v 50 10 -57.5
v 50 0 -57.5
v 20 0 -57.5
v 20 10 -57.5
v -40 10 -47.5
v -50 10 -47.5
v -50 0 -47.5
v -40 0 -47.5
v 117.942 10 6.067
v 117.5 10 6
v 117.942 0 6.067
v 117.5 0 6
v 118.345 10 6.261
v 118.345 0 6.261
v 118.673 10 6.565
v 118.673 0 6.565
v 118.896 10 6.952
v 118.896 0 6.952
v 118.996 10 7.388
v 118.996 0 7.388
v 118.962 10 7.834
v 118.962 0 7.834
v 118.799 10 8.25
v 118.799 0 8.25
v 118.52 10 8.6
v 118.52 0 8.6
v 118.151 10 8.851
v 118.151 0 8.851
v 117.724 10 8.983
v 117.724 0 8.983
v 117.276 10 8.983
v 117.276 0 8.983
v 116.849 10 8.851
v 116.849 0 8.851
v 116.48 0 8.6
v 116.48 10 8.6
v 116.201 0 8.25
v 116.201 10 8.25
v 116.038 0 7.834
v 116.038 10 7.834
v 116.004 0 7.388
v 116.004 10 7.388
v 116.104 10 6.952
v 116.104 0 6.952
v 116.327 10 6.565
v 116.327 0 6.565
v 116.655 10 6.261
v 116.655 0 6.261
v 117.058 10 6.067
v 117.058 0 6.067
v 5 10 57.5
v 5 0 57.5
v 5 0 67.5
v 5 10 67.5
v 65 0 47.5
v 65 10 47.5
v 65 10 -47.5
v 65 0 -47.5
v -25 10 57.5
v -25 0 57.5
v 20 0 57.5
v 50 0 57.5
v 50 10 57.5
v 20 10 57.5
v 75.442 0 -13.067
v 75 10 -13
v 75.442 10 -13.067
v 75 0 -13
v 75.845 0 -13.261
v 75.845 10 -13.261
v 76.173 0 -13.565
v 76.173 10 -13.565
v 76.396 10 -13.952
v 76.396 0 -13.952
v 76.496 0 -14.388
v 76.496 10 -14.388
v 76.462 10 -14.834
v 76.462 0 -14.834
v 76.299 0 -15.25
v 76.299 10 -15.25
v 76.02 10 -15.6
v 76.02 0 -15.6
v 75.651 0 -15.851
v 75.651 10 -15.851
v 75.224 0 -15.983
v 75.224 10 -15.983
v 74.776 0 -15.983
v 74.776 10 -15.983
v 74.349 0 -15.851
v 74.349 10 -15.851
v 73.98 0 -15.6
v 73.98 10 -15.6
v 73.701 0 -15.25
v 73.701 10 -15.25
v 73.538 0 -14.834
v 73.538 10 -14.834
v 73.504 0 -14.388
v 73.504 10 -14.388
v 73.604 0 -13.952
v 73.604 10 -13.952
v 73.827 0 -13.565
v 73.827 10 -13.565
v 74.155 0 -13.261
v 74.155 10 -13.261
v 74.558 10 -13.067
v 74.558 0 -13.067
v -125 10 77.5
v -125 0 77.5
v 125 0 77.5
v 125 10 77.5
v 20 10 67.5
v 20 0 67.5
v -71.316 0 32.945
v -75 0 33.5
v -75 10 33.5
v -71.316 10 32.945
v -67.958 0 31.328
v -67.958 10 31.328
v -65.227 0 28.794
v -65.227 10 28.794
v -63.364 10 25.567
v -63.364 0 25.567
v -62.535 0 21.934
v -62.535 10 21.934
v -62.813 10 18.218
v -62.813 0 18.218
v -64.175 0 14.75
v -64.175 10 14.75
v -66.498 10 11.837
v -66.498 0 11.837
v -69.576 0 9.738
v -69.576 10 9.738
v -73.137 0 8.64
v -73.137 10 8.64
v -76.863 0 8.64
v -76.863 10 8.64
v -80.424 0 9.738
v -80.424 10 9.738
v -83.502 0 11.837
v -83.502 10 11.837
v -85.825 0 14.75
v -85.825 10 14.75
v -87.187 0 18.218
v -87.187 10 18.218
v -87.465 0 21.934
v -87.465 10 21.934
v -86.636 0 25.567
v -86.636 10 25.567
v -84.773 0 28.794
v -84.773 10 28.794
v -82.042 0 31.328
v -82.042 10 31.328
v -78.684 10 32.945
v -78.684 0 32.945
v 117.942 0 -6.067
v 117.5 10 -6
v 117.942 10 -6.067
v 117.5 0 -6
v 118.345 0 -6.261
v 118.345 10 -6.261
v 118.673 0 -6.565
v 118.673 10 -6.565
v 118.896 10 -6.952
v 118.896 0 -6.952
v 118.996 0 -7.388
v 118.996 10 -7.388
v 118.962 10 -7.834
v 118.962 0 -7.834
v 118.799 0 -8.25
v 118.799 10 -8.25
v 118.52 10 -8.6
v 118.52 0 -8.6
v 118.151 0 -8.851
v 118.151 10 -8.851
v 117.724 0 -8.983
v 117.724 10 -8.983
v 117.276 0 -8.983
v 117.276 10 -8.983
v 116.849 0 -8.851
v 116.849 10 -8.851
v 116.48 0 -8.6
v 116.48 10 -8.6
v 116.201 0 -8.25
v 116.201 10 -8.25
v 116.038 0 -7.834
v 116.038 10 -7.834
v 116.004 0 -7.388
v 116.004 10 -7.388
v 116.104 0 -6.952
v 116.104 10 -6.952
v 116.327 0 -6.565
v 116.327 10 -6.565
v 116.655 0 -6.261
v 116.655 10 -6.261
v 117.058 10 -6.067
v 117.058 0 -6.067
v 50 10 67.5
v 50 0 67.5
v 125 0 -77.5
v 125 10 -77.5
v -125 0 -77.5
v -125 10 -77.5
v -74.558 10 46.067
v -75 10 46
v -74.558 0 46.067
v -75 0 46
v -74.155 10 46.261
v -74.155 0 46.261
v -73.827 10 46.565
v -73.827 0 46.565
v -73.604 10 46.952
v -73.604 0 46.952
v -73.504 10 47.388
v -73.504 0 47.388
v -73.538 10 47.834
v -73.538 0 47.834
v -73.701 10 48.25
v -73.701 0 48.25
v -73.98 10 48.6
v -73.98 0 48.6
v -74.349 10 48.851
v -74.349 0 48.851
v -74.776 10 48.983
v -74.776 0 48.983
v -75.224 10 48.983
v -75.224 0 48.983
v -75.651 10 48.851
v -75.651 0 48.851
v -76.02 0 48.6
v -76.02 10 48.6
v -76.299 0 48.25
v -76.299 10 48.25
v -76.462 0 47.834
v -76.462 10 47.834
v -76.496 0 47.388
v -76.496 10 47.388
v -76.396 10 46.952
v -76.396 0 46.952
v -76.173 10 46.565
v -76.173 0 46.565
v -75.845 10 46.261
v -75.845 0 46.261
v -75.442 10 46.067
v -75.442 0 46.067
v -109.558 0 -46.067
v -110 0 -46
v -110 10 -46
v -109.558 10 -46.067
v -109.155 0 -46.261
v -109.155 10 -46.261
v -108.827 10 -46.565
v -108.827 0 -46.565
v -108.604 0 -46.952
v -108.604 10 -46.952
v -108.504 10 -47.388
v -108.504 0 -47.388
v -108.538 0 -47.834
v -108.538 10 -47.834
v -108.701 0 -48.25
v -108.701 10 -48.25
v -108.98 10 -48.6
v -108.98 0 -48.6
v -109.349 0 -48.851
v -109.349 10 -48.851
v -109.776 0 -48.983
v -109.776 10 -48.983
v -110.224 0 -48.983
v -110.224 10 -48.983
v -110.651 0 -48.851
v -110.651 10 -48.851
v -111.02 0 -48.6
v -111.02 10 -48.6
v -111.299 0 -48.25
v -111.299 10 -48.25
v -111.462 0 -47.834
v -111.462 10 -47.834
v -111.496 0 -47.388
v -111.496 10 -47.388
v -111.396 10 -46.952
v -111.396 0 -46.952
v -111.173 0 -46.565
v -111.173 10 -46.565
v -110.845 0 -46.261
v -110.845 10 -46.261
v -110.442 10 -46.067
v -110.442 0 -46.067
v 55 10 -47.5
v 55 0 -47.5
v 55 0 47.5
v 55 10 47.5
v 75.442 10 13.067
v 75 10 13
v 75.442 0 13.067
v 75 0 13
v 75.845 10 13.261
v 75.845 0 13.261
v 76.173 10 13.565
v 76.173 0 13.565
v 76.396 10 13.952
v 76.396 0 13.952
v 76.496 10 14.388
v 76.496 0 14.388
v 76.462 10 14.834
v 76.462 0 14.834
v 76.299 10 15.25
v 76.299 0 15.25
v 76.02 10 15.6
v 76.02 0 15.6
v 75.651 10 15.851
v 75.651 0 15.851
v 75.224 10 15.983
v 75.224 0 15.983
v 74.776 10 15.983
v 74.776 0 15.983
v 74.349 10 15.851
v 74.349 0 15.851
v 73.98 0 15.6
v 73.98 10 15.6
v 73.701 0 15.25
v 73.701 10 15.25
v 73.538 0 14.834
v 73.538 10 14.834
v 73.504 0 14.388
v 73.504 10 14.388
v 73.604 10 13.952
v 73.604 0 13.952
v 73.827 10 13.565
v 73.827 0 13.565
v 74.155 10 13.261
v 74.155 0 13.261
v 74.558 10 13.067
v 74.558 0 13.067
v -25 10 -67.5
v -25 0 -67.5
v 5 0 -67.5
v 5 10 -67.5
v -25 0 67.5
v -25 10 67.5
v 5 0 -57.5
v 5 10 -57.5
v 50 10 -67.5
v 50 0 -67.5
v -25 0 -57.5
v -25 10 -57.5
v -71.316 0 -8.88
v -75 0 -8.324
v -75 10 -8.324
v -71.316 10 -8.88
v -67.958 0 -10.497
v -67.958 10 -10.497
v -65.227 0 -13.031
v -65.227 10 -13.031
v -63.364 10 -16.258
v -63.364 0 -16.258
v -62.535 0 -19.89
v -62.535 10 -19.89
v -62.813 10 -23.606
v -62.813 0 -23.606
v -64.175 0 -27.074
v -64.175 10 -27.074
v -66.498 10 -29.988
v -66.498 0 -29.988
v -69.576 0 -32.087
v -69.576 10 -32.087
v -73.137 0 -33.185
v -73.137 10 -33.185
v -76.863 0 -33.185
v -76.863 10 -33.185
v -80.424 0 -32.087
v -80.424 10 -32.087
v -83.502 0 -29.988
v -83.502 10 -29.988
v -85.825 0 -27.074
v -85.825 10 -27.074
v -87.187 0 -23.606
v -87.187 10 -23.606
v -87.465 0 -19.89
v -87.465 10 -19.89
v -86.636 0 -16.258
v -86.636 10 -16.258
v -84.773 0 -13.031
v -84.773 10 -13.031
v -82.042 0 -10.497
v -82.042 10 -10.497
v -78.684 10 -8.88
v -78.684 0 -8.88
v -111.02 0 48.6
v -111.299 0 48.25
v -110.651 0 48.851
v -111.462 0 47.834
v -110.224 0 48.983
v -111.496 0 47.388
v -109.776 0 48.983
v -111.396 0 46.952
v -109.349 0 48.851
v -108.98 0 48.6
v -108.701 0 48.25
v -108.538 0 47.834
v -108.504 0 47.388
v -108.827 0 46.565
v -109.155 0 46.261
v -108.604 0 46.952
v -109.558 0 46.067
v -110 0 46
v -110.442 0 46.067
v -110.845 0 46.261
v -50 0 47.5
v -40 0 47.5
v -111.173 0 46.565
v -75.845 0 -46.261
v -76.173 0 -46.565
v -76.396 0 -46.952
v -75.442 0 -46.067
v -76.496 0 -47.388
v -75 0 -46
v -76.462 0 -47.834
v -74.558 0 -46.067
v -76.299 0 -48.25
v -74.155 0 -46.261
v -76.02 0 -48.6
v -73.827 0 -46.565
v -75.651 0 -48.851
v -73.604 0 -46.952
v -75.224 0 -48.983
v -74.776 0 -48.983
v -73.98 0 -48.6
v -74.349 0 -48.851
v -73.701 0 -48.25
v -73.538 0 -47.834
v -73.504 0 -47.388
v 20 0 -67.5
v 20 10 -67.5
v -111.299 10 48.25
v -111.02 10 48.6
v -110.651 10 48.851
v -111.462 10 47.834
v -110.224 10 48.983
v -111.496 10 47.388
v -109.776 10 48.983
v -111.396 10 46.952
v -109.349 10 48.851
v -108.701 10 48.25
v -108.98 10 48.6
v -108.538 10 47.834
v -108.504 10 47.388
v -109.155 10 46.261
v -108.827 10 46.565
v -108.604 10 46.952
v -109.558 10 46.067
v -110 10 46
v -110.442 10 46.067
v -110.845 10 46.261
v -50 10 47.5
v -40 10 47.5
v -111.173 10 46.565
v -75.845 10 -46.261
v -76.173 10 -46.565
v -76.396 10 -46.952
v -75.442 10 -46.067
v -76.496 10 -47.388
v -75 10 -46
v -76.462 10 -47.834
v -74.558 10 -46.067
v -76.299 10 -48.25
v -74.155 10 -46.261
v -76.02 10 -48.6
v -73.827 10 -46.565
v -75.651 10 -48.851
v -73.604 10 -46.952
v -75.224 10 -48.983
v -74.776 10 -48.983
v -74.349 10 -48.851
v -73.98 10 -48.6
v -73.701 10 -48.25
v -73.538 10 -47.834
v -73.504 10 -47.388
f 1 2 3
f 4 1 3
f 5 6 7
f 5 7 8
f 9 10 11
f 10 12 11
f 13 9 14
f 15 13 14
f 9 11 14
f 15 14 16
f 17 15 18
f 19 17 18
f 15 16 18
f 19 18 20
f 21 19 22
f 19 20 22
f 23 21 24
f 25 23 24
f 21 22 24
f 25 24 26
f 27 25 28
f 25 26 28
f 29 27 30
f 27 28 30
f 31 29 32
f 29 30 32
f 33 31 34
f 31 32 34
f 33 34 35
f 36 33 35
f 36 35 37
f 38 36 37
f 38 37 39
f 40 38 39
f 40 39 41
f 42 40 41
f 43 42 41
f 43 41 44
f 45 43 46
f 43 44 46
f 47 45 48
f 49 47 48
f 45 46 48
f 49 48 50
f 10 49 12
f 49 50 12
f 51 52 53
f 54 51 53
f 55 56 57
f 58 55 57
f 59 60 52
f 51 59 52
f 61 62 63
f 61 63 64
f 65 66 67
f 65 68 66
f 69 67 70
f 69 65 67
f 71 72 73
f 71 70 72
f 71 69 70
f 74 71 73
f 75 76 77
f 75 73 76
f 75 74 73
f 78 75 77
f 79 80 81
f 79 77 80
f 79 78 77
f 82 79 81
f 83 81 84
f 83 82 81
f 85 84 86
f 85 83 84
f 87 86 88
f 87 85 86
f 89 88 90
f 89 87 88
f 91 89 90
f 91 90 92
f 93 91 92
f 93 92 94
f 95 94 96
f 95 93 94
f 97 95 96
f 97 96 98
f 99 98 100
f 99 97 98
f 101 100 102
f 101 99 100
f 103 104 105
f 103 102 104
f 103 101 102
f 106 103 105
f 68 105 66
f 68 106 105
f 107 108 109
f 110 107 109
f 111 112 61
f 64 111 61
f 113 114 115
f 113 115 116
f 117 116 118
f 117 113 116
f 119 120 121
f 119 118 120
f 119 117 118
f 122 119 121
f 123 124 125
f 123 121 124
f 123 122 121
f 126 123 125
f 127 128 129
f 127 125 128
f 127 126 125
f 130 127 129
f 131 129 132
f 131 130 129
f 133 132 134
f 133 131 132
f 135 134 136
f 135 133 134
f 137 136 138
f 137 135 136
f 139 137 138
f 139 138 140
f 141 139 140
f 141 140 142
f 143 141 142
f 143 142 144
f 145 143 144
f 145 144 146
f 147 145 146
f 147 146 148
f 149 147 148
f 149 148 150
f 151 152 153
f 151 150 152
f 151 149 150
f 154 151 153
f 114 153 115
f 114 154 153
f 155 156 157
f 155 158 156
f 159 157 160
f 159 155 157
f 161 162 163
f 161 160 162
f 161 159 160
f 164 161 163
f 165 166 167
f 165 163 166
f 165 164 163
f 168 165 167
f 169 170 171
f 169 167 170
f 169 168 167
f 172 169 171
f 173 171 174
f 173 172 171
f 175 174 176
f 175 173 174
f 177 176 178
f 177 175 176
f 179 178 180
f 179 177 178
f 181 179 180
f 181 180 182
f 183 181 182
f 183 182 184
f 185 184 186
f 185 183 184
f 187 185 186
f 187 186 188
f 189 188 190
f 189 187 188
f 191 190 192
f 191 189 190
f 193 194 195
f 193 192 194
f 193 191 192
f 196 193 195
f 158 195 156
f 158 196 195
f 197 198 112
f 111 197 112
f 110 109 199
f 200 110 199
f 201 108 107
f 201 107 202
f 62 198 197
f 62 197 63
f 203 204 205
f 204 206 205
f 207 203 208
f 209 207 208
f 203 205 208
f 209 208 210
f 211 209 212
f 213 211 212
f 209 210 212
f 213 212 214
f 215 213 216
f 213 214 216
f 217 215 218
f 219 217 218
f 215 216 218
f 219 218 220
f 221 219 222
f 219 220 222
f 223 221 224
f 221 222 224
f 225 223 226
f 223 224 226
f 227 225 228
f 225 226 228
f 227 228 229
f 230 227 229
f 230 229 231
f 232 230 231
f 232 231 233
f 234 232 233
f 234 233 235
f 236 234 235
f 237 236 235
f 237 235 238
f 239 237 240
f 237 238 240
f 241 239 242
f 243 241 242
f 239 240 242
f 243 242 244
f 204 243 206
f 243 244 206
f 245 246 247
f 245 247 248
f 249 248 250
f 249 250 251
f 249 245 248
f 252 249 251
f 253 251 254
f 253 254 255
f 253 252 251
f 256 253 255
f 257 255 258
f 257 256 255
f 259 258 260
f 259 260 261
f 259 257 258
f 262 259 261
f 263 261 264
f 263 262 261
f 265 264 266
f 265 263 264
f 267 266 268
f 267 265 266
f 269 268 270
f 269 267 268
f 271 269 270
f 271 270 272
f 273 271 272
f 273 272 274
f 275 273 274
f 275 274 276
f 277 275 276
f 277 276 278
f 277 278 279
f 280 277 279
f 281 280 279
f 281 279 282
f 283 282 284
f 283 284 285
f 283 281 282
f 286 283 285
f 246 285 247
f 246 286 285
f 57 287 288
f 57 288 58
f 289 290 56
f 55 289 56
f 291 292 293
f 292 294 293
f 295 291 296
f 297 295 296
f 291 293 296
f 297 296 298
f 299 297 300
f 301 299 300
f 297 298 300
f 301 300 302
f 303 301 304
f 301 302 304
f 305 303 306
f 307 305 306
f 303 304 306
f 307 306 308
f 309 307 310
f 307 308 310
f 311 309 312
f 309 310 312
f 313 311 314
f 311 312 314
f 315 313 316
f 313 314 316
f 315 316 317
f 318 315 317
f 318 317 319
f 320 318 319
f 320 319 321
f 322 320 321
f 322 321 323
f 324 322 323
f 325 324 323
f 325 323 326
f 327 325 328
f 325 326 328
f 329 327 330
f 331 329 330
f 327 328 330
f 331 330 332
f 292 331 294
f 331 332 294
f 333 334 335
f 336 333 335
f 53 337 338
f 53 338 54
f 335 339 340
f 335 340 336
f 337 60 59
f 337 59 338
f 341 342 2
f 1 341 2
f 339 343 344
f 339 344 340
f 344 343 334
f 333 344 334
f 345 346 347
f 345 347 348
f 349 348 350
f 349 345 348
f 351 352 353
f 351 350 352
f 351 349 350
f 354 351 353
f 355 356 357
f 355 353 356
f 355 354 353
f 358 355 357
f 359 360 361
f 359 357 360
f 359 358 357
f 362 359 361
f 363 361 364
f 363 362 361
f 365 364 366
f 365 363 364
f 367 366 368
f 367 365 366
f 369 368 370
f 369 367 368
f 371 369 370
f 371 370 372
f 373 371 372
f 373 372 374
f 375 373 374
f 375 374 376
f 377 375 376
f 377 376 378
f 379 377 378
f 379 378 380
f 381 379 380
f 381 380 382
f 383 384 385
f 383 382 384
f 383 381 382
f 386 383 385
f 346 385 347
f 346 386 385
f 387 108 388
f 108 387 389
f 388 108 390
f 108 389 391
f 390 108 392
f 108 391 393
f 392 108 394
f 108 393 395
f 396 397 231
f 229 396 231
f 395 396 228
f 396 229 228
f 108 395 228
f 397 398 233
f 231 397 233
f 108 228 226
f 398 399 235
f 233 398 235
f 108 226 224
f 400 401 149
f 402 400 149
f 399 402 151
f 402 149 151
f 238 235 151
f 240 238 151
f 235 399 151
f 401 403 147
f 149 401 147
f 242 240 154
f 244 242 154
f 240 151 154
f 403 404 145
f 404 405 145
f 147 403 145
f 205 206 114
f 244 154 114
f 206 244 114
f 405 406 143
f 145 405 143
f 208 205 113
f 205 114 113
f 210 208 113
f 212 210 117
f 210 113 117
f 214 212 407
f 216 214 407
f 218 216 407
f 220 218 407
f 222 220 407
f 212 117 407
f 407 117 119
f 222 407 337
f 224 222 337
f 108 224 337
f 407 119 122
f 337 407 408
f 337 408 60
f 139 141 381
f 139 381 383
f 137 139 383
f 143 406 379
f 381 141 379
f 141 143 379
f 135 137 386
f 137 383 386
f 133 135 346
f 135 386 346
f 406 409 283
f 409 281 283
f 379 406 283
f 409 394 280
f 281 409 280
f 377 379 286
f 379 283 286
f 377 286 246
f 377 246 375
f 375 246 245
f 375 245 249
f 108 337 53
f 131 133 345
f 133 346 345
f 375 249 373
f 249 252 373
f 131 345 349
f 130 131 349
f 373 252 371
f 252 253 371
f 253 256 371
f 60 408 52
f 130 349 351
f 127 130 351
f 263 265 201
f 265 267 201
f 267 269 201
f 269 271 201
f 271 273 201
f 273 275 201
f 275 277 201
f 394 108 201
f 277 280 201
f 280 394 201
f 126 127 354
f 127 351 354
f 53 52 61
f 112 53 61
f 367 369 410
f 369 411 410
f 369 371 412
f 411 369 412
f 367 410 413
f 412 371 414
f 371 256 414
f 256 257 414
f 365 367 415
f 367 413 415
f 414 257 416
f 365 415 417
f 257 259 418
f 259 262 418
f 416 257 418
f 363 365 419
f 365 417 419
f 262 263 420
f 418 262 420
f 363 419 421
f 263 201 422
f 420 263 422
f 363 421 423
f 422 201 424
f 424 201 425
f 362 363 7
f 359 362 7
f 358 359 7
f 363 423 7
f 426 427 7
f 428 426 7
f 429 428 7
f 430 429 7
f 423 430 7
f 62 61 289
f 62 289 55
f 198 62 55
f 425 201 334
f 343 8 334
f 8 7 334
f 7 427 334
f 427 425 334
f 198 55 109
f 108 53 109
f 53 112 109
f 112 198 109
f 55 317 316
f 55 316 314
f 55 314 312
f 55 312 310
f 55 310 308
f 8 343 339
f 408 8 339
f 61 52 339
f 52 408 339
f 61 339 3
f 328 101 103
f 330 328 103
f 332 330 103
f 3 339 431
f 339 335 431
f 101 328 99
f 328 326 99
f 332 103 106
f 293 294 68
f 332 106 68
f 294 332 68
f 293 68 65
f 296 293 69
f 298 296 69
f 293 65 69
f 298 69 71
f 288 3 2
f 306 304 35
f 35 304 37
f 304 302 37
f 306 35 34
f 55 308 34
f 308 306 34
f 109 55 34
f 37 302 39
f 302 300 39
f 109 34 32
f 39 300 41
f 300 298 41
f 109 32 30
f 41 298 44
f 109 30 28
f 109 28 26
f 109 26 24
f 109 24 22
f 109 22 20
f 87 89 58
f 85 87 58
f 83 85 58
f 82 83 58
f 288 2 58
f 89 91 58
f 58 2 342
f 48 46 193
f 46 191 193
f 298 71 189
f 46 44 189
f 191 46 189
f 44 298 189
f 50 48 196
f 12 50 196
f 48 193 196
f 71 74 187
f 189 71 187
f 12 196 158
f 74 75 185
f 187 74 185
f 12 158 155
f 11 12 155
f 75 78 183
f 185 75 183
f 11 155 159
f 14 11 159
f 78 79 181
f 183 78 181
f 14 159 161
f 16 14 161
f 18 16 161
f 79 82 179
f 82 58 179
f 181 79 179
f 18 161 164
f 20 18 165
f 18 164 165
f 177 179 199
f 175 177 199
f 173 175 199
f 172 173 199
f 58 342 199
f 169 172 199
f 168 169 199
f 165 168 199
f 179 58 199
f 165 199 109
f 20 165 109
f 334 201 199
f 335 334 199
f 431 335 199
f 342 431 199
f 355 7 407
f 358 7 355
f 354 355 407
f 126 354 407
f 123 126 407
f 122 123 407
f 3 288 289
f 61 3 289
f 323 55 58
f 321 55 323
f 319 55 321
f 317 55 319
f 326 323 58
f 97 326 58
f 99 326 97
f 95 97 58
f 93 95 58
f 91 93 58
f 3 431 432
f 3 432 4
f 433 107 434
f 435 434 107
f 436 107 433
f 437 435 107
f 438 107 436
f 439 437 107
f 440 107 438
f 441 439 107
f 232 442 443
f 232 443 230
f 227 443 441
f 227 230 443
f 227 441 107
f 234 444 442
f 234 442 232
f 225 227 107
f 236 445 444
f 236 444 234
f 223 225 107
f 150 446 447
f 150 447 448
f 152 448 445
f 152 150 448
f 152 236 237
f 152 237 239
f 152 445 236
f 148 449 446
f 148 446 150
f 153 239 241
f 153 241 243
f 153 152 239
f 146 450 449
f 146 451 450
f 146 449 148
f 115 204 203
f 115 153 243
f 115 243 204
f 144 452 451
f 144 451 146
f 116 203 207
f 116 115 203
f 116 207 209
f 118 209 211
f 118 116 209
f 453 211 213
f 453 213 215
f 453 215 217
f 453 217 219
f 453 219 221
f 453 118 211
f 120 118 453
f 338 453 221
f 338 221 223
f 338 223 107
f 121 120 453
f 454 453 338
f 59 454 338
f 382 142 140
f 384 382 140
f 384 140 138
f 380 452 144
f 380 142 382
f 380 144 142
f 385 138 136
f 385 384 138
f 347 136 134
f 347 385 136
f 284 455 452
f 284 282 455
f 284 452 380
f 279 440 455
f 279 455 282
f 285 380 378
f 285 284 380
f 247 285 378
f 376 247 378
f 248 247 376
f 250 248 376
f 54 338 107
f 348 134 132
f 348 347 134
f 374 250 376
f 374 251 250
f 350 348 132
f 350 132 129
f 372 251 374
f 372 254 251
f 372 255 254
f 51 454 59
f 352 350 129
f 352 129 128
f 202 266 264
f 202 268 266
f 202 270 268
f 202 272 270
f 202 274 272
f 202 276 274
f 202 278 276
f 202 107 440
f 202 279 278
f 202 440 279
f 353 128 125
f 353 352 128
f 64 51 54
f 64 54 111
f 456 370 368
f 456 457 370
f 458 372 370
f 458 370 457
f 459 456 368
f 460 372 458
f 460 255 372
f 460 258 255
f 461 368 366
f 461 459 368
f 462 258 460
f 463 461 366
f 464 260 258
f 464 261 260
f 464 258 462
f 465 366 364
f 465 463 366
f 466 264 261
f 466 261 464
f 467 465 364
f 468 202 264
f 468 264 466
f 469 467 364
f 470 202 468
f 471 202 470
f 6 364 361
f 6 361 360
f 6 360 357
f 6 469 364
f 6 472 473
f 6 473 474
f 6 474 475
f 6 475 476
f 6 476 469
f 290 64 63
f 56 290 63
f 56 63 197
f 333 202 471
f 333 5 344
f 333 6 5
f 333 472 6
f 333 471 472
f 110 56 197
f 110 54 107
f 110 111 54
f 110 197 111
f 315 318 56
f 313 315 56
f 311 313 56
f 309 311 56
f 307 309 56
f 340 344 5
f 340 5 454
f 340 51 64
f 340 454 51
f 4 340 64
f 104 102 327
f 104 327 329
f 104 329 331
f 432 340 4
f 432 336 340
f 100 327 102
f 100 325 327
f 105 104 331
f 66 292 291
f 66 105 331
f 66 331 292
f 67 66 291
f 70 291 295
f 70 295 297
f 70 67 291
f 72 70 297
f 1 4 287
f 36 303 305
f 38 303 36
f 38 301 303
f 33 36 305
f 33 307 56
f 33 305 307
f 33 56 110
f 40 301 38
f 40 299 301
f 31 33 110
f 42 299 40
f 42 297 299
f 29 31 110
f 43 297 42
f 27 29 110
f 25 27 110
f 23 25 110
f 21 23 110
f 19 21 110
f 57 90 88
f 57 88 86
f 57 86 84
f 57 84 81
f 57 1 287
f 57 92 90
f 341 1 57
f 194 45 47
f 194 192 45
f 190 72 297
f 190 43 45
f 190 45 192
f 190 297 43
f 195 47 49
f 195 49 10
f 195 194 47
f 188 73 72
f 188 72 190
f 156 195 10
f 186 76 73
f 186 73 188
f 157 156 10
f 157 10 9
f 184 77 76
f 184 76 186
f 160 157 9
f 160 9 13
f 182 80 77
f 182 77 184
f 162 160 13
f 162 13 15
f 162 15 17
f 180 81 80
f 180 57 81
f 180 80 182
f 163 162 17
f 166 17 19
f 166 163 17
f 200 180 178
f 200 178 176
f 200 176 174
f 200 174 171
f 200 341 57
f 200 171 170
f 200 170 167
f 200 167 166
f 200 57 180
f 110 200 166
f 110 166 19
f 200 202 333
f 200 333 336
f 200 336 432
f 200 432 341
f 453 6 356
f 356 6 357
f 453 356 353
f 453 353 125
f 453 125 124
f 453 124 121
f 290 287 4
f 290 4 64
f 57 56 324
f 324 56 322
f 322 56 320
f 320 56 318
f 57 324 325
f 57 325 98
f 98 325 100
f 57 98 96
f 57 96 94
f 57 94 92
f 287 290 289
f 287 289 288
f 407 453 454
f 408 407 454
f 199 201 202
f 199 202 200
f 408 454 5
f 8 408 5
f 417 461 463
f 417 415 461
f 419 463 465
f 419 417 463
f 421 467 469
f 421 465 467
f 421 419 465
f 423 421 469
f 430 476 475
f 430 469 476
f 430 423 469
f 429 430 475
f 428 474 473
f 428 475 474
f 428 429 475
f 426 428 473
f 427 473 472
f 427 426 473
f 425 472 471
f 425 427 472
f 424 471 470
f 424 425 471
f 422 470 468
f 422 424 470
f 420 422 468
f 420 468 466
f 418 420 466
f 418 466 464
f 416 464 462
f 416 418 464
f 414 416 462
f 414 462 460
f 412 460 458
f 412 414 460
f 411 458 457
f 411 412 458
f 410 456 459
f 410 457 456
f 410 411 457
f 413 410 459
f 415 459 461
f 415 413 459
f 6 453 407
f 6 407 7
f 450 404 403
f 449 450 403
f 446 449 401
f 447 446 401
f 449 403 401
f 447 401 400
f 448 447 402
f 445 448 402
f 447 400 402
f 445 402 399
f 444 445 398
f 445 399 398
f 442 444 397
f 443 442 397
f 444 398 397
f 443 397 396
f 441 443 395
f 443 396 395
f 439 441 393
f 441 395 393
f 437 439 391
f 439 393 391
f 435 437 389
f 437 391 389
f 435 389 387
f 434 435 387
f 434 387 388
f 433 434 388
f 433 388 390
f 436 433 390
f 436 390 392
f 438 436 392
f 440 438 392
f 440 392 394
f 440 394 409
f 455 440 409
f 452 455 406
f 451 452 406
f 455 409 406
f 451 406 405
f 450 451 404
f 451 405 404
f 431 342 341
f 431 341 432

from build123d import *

# Parameters (mm, degrees)
SKETCH4_W               = 250
SKETCH4_H               = 155
BOSS_EXTRUDE2_DEPTH     = 10
SKETCH5_R               = 1.5
CUT_EXTRUDE1_DEPTH      = 10
SKETCH6_R               = 1.5
CUT_EXTRUDE2_DEPTH      = 148.415229878
CUT_EXTRUDE4_DEPTH      = 299.317469373
CUT_EXTRUDE4_DEPTH_BACK = 299.317469373
SKETCH8_R               = 12.5
SKETCH10_R              = 1.5
CUT_EXTRUDE5_DEPTH      = 148.415229878
SKETCH11_W              = 30
SKETCH11_H              = 10
CUT_EXTRUDE6_DEPTH      = 148.415229878
SKETCH12_W              = 30
SKETCH12_H              = 10
CUT_EXTRUDE7_DEPTH      = 148.415229878
SKETCH14_R              = 1.5
CUT_EXTRUDE8_DEPTH      = 148.415229878
SKETCH16_W              = 10
SKETCH16_H              = 95
CUT_EXTRUDE9_DEPTH      = 10


with BuildPart() as part:
    # Sketch4 → Boss-Extrude2 (new body)
    with BuildSketch(Plane(origin=(0, 0, 0), x_dir=(1, 0, 0), z_dir=(0, 1, 0))):
        Rectangle(SKETCH4_W, SKETCH4_H)
    extrude(amount=BOSS_EXTRUDE2_DEPTH)

    # Sketch5 → Cut-Extrude1 (cut)
    with BuildSketch(Plane.XZ):
        with Locations(Location((-110, 47.5, 0), (0, 0, 270))):
            Circle(SKETCH5_R)
    cut_extrude1 = extrude(amount=-CUT_EXTRUDE1_DEPTH, mode=Mode.SUBTRACT)

    # Mirror1: Cut-Extrude1 across plane
    add(cut_extrude1.mirror(Plane.XY), mode=Mode.SUBTRACT)

    # Sketch6 → Cut-Extrude2 (cut, symmetric)
    with BuildSketch(Plane.XZ):
        with Locations(Location((75, 14.5, 0), (0, 0, 270))):
            Circle(SKETCH6_R)
    cut_extrude2 = extrude(amount=CUT_EXTRUDE2_DEPTH, both=True, mode=Mode.SUBTRACT)

    # Mirror2: Cut-Extrude2 across plane
    add(cut_extrude2.mirror(Plane.XY), mode=Mode.SUBTRACT)

    # Sketch8 → Cut-Extrude4 (cut, two sides: drawn at the far end of the back side and taken through both)
    with BuildSketch(Plane(origin=(-47.523167836, 19.5, 165.087755447), x_dir=(1, 0, 0), z_dir=(0, 1, 0)).offset(-CUT_EXTRUDE4_DEPTH_BACK)):
        with Locations(Location((-27.476832164, 144.087755447, 0), (0, 0, 270))):
            Circle(SKETCH8_R)
        with Locations(Location((-27.476832164, 185.912244553, 0), (0, 0, 270))):
            Circle(SKETCH8_R)
    extrude(amount=CUT_EXTRUDE4_DEPTH + CUT_EXTRUDE4_DEPTH_BACK, mode=Mode.SUBTRACT)

    # Sketch10 → Cut-Extrude5 (cut, symmetric)
    with BuildSketch(Plane(origin=(0, 0, 0), x_dir=(-1, 0, 0), z_dir=(0, -1, 0))):
        with Locations(Location((75, -47.5, 0), (0, 0, 90))):
            Circle(SKETCH10_R)
    cut_extrude5 = extrude(amount=CUT_EXTRUDE5_DEPTH, both=True, mode=Mode.SUBTRACT)

    # Mirror3: Cut-Extrude5 across plane
    add(cut_extrude5.mirror(Plane.XY), mode=Mode.SUBTRACT)

    # Sketch11 → Cut-Extrude6 (cut, symmetric)
    with BuildSketch(Plane.XZ):
        with Locations((-10, 62.5)):
            Rectangle(SKETCH11_W, SKETCH11_H)
    cut_extrude6 = extrude(amount=CUT_EXTRUDE6_DEPTH, both=True, mode=Mode.SUBTRACT)

    # Sketch12 → Cut-Extrude7 (cut, symmetric)
    with BuildSketch(Plane(origin=(0, 0, 0), x_dir=(-1, 0, 0), z_dir=(0, -1, 0))):
        with Locations((-35, -62.5)):
            Rectangle(SKETCH12_W, SKETCH12_H)
    cut_extrude7 = extrude(amount=CUT_EXTRUDE7_DEPTH, both=True, mode=Mode.SUBTRACT)

    # Mirror4: Cut-Extrude6, Cut-Extrude7 across plane
    add(cut_extrude6.mirror(Plane.XY), mode=Mode.SUBTRACT)
    add(cut_extrude7.mirror(Plane.XY), mode=Mode.SUBTRACT)

    # Sketch14 → Cut-Extrude8 (cut, symmetric)
    with BuildSketch(Plane.XZ):
        with Locations(Location((117.5, 7.5, 0), (0, 0, 270))):
            Circle(SKETCH14_R)
    cut_extrude8 = extrude(amount=CUT_EXTRUDE8_DEPTH, both=True, mode=Mode.SUBTRACT)

    # Mirror5: Cut-Extrude8 across plane
    add(cut_extrude8.mirror(Plane.XY), mode=Mode.SUBTRACT)

    # Sketch16 → Cut-Extrude9 (cut)
    with BuildSketch(Plane(origin=(-47.523167836, 10, 165.087755447), x_dir=(1, 0, 0), z_dir=(0, 1, 0))):
        with Locations((107.523167836, 165.087755447)):
            Rectangle(SKETCH16_W, SKETCH16_H)
        with Locations((2.523167836, 165.087755447)):
            Rectangle(SKETCH16_W, SKETCH16_H)
    extrude(amount=-CUT_EXTRUDE9_DEPTH, mode=Mode.SUBTRACT)


solid = part.part
